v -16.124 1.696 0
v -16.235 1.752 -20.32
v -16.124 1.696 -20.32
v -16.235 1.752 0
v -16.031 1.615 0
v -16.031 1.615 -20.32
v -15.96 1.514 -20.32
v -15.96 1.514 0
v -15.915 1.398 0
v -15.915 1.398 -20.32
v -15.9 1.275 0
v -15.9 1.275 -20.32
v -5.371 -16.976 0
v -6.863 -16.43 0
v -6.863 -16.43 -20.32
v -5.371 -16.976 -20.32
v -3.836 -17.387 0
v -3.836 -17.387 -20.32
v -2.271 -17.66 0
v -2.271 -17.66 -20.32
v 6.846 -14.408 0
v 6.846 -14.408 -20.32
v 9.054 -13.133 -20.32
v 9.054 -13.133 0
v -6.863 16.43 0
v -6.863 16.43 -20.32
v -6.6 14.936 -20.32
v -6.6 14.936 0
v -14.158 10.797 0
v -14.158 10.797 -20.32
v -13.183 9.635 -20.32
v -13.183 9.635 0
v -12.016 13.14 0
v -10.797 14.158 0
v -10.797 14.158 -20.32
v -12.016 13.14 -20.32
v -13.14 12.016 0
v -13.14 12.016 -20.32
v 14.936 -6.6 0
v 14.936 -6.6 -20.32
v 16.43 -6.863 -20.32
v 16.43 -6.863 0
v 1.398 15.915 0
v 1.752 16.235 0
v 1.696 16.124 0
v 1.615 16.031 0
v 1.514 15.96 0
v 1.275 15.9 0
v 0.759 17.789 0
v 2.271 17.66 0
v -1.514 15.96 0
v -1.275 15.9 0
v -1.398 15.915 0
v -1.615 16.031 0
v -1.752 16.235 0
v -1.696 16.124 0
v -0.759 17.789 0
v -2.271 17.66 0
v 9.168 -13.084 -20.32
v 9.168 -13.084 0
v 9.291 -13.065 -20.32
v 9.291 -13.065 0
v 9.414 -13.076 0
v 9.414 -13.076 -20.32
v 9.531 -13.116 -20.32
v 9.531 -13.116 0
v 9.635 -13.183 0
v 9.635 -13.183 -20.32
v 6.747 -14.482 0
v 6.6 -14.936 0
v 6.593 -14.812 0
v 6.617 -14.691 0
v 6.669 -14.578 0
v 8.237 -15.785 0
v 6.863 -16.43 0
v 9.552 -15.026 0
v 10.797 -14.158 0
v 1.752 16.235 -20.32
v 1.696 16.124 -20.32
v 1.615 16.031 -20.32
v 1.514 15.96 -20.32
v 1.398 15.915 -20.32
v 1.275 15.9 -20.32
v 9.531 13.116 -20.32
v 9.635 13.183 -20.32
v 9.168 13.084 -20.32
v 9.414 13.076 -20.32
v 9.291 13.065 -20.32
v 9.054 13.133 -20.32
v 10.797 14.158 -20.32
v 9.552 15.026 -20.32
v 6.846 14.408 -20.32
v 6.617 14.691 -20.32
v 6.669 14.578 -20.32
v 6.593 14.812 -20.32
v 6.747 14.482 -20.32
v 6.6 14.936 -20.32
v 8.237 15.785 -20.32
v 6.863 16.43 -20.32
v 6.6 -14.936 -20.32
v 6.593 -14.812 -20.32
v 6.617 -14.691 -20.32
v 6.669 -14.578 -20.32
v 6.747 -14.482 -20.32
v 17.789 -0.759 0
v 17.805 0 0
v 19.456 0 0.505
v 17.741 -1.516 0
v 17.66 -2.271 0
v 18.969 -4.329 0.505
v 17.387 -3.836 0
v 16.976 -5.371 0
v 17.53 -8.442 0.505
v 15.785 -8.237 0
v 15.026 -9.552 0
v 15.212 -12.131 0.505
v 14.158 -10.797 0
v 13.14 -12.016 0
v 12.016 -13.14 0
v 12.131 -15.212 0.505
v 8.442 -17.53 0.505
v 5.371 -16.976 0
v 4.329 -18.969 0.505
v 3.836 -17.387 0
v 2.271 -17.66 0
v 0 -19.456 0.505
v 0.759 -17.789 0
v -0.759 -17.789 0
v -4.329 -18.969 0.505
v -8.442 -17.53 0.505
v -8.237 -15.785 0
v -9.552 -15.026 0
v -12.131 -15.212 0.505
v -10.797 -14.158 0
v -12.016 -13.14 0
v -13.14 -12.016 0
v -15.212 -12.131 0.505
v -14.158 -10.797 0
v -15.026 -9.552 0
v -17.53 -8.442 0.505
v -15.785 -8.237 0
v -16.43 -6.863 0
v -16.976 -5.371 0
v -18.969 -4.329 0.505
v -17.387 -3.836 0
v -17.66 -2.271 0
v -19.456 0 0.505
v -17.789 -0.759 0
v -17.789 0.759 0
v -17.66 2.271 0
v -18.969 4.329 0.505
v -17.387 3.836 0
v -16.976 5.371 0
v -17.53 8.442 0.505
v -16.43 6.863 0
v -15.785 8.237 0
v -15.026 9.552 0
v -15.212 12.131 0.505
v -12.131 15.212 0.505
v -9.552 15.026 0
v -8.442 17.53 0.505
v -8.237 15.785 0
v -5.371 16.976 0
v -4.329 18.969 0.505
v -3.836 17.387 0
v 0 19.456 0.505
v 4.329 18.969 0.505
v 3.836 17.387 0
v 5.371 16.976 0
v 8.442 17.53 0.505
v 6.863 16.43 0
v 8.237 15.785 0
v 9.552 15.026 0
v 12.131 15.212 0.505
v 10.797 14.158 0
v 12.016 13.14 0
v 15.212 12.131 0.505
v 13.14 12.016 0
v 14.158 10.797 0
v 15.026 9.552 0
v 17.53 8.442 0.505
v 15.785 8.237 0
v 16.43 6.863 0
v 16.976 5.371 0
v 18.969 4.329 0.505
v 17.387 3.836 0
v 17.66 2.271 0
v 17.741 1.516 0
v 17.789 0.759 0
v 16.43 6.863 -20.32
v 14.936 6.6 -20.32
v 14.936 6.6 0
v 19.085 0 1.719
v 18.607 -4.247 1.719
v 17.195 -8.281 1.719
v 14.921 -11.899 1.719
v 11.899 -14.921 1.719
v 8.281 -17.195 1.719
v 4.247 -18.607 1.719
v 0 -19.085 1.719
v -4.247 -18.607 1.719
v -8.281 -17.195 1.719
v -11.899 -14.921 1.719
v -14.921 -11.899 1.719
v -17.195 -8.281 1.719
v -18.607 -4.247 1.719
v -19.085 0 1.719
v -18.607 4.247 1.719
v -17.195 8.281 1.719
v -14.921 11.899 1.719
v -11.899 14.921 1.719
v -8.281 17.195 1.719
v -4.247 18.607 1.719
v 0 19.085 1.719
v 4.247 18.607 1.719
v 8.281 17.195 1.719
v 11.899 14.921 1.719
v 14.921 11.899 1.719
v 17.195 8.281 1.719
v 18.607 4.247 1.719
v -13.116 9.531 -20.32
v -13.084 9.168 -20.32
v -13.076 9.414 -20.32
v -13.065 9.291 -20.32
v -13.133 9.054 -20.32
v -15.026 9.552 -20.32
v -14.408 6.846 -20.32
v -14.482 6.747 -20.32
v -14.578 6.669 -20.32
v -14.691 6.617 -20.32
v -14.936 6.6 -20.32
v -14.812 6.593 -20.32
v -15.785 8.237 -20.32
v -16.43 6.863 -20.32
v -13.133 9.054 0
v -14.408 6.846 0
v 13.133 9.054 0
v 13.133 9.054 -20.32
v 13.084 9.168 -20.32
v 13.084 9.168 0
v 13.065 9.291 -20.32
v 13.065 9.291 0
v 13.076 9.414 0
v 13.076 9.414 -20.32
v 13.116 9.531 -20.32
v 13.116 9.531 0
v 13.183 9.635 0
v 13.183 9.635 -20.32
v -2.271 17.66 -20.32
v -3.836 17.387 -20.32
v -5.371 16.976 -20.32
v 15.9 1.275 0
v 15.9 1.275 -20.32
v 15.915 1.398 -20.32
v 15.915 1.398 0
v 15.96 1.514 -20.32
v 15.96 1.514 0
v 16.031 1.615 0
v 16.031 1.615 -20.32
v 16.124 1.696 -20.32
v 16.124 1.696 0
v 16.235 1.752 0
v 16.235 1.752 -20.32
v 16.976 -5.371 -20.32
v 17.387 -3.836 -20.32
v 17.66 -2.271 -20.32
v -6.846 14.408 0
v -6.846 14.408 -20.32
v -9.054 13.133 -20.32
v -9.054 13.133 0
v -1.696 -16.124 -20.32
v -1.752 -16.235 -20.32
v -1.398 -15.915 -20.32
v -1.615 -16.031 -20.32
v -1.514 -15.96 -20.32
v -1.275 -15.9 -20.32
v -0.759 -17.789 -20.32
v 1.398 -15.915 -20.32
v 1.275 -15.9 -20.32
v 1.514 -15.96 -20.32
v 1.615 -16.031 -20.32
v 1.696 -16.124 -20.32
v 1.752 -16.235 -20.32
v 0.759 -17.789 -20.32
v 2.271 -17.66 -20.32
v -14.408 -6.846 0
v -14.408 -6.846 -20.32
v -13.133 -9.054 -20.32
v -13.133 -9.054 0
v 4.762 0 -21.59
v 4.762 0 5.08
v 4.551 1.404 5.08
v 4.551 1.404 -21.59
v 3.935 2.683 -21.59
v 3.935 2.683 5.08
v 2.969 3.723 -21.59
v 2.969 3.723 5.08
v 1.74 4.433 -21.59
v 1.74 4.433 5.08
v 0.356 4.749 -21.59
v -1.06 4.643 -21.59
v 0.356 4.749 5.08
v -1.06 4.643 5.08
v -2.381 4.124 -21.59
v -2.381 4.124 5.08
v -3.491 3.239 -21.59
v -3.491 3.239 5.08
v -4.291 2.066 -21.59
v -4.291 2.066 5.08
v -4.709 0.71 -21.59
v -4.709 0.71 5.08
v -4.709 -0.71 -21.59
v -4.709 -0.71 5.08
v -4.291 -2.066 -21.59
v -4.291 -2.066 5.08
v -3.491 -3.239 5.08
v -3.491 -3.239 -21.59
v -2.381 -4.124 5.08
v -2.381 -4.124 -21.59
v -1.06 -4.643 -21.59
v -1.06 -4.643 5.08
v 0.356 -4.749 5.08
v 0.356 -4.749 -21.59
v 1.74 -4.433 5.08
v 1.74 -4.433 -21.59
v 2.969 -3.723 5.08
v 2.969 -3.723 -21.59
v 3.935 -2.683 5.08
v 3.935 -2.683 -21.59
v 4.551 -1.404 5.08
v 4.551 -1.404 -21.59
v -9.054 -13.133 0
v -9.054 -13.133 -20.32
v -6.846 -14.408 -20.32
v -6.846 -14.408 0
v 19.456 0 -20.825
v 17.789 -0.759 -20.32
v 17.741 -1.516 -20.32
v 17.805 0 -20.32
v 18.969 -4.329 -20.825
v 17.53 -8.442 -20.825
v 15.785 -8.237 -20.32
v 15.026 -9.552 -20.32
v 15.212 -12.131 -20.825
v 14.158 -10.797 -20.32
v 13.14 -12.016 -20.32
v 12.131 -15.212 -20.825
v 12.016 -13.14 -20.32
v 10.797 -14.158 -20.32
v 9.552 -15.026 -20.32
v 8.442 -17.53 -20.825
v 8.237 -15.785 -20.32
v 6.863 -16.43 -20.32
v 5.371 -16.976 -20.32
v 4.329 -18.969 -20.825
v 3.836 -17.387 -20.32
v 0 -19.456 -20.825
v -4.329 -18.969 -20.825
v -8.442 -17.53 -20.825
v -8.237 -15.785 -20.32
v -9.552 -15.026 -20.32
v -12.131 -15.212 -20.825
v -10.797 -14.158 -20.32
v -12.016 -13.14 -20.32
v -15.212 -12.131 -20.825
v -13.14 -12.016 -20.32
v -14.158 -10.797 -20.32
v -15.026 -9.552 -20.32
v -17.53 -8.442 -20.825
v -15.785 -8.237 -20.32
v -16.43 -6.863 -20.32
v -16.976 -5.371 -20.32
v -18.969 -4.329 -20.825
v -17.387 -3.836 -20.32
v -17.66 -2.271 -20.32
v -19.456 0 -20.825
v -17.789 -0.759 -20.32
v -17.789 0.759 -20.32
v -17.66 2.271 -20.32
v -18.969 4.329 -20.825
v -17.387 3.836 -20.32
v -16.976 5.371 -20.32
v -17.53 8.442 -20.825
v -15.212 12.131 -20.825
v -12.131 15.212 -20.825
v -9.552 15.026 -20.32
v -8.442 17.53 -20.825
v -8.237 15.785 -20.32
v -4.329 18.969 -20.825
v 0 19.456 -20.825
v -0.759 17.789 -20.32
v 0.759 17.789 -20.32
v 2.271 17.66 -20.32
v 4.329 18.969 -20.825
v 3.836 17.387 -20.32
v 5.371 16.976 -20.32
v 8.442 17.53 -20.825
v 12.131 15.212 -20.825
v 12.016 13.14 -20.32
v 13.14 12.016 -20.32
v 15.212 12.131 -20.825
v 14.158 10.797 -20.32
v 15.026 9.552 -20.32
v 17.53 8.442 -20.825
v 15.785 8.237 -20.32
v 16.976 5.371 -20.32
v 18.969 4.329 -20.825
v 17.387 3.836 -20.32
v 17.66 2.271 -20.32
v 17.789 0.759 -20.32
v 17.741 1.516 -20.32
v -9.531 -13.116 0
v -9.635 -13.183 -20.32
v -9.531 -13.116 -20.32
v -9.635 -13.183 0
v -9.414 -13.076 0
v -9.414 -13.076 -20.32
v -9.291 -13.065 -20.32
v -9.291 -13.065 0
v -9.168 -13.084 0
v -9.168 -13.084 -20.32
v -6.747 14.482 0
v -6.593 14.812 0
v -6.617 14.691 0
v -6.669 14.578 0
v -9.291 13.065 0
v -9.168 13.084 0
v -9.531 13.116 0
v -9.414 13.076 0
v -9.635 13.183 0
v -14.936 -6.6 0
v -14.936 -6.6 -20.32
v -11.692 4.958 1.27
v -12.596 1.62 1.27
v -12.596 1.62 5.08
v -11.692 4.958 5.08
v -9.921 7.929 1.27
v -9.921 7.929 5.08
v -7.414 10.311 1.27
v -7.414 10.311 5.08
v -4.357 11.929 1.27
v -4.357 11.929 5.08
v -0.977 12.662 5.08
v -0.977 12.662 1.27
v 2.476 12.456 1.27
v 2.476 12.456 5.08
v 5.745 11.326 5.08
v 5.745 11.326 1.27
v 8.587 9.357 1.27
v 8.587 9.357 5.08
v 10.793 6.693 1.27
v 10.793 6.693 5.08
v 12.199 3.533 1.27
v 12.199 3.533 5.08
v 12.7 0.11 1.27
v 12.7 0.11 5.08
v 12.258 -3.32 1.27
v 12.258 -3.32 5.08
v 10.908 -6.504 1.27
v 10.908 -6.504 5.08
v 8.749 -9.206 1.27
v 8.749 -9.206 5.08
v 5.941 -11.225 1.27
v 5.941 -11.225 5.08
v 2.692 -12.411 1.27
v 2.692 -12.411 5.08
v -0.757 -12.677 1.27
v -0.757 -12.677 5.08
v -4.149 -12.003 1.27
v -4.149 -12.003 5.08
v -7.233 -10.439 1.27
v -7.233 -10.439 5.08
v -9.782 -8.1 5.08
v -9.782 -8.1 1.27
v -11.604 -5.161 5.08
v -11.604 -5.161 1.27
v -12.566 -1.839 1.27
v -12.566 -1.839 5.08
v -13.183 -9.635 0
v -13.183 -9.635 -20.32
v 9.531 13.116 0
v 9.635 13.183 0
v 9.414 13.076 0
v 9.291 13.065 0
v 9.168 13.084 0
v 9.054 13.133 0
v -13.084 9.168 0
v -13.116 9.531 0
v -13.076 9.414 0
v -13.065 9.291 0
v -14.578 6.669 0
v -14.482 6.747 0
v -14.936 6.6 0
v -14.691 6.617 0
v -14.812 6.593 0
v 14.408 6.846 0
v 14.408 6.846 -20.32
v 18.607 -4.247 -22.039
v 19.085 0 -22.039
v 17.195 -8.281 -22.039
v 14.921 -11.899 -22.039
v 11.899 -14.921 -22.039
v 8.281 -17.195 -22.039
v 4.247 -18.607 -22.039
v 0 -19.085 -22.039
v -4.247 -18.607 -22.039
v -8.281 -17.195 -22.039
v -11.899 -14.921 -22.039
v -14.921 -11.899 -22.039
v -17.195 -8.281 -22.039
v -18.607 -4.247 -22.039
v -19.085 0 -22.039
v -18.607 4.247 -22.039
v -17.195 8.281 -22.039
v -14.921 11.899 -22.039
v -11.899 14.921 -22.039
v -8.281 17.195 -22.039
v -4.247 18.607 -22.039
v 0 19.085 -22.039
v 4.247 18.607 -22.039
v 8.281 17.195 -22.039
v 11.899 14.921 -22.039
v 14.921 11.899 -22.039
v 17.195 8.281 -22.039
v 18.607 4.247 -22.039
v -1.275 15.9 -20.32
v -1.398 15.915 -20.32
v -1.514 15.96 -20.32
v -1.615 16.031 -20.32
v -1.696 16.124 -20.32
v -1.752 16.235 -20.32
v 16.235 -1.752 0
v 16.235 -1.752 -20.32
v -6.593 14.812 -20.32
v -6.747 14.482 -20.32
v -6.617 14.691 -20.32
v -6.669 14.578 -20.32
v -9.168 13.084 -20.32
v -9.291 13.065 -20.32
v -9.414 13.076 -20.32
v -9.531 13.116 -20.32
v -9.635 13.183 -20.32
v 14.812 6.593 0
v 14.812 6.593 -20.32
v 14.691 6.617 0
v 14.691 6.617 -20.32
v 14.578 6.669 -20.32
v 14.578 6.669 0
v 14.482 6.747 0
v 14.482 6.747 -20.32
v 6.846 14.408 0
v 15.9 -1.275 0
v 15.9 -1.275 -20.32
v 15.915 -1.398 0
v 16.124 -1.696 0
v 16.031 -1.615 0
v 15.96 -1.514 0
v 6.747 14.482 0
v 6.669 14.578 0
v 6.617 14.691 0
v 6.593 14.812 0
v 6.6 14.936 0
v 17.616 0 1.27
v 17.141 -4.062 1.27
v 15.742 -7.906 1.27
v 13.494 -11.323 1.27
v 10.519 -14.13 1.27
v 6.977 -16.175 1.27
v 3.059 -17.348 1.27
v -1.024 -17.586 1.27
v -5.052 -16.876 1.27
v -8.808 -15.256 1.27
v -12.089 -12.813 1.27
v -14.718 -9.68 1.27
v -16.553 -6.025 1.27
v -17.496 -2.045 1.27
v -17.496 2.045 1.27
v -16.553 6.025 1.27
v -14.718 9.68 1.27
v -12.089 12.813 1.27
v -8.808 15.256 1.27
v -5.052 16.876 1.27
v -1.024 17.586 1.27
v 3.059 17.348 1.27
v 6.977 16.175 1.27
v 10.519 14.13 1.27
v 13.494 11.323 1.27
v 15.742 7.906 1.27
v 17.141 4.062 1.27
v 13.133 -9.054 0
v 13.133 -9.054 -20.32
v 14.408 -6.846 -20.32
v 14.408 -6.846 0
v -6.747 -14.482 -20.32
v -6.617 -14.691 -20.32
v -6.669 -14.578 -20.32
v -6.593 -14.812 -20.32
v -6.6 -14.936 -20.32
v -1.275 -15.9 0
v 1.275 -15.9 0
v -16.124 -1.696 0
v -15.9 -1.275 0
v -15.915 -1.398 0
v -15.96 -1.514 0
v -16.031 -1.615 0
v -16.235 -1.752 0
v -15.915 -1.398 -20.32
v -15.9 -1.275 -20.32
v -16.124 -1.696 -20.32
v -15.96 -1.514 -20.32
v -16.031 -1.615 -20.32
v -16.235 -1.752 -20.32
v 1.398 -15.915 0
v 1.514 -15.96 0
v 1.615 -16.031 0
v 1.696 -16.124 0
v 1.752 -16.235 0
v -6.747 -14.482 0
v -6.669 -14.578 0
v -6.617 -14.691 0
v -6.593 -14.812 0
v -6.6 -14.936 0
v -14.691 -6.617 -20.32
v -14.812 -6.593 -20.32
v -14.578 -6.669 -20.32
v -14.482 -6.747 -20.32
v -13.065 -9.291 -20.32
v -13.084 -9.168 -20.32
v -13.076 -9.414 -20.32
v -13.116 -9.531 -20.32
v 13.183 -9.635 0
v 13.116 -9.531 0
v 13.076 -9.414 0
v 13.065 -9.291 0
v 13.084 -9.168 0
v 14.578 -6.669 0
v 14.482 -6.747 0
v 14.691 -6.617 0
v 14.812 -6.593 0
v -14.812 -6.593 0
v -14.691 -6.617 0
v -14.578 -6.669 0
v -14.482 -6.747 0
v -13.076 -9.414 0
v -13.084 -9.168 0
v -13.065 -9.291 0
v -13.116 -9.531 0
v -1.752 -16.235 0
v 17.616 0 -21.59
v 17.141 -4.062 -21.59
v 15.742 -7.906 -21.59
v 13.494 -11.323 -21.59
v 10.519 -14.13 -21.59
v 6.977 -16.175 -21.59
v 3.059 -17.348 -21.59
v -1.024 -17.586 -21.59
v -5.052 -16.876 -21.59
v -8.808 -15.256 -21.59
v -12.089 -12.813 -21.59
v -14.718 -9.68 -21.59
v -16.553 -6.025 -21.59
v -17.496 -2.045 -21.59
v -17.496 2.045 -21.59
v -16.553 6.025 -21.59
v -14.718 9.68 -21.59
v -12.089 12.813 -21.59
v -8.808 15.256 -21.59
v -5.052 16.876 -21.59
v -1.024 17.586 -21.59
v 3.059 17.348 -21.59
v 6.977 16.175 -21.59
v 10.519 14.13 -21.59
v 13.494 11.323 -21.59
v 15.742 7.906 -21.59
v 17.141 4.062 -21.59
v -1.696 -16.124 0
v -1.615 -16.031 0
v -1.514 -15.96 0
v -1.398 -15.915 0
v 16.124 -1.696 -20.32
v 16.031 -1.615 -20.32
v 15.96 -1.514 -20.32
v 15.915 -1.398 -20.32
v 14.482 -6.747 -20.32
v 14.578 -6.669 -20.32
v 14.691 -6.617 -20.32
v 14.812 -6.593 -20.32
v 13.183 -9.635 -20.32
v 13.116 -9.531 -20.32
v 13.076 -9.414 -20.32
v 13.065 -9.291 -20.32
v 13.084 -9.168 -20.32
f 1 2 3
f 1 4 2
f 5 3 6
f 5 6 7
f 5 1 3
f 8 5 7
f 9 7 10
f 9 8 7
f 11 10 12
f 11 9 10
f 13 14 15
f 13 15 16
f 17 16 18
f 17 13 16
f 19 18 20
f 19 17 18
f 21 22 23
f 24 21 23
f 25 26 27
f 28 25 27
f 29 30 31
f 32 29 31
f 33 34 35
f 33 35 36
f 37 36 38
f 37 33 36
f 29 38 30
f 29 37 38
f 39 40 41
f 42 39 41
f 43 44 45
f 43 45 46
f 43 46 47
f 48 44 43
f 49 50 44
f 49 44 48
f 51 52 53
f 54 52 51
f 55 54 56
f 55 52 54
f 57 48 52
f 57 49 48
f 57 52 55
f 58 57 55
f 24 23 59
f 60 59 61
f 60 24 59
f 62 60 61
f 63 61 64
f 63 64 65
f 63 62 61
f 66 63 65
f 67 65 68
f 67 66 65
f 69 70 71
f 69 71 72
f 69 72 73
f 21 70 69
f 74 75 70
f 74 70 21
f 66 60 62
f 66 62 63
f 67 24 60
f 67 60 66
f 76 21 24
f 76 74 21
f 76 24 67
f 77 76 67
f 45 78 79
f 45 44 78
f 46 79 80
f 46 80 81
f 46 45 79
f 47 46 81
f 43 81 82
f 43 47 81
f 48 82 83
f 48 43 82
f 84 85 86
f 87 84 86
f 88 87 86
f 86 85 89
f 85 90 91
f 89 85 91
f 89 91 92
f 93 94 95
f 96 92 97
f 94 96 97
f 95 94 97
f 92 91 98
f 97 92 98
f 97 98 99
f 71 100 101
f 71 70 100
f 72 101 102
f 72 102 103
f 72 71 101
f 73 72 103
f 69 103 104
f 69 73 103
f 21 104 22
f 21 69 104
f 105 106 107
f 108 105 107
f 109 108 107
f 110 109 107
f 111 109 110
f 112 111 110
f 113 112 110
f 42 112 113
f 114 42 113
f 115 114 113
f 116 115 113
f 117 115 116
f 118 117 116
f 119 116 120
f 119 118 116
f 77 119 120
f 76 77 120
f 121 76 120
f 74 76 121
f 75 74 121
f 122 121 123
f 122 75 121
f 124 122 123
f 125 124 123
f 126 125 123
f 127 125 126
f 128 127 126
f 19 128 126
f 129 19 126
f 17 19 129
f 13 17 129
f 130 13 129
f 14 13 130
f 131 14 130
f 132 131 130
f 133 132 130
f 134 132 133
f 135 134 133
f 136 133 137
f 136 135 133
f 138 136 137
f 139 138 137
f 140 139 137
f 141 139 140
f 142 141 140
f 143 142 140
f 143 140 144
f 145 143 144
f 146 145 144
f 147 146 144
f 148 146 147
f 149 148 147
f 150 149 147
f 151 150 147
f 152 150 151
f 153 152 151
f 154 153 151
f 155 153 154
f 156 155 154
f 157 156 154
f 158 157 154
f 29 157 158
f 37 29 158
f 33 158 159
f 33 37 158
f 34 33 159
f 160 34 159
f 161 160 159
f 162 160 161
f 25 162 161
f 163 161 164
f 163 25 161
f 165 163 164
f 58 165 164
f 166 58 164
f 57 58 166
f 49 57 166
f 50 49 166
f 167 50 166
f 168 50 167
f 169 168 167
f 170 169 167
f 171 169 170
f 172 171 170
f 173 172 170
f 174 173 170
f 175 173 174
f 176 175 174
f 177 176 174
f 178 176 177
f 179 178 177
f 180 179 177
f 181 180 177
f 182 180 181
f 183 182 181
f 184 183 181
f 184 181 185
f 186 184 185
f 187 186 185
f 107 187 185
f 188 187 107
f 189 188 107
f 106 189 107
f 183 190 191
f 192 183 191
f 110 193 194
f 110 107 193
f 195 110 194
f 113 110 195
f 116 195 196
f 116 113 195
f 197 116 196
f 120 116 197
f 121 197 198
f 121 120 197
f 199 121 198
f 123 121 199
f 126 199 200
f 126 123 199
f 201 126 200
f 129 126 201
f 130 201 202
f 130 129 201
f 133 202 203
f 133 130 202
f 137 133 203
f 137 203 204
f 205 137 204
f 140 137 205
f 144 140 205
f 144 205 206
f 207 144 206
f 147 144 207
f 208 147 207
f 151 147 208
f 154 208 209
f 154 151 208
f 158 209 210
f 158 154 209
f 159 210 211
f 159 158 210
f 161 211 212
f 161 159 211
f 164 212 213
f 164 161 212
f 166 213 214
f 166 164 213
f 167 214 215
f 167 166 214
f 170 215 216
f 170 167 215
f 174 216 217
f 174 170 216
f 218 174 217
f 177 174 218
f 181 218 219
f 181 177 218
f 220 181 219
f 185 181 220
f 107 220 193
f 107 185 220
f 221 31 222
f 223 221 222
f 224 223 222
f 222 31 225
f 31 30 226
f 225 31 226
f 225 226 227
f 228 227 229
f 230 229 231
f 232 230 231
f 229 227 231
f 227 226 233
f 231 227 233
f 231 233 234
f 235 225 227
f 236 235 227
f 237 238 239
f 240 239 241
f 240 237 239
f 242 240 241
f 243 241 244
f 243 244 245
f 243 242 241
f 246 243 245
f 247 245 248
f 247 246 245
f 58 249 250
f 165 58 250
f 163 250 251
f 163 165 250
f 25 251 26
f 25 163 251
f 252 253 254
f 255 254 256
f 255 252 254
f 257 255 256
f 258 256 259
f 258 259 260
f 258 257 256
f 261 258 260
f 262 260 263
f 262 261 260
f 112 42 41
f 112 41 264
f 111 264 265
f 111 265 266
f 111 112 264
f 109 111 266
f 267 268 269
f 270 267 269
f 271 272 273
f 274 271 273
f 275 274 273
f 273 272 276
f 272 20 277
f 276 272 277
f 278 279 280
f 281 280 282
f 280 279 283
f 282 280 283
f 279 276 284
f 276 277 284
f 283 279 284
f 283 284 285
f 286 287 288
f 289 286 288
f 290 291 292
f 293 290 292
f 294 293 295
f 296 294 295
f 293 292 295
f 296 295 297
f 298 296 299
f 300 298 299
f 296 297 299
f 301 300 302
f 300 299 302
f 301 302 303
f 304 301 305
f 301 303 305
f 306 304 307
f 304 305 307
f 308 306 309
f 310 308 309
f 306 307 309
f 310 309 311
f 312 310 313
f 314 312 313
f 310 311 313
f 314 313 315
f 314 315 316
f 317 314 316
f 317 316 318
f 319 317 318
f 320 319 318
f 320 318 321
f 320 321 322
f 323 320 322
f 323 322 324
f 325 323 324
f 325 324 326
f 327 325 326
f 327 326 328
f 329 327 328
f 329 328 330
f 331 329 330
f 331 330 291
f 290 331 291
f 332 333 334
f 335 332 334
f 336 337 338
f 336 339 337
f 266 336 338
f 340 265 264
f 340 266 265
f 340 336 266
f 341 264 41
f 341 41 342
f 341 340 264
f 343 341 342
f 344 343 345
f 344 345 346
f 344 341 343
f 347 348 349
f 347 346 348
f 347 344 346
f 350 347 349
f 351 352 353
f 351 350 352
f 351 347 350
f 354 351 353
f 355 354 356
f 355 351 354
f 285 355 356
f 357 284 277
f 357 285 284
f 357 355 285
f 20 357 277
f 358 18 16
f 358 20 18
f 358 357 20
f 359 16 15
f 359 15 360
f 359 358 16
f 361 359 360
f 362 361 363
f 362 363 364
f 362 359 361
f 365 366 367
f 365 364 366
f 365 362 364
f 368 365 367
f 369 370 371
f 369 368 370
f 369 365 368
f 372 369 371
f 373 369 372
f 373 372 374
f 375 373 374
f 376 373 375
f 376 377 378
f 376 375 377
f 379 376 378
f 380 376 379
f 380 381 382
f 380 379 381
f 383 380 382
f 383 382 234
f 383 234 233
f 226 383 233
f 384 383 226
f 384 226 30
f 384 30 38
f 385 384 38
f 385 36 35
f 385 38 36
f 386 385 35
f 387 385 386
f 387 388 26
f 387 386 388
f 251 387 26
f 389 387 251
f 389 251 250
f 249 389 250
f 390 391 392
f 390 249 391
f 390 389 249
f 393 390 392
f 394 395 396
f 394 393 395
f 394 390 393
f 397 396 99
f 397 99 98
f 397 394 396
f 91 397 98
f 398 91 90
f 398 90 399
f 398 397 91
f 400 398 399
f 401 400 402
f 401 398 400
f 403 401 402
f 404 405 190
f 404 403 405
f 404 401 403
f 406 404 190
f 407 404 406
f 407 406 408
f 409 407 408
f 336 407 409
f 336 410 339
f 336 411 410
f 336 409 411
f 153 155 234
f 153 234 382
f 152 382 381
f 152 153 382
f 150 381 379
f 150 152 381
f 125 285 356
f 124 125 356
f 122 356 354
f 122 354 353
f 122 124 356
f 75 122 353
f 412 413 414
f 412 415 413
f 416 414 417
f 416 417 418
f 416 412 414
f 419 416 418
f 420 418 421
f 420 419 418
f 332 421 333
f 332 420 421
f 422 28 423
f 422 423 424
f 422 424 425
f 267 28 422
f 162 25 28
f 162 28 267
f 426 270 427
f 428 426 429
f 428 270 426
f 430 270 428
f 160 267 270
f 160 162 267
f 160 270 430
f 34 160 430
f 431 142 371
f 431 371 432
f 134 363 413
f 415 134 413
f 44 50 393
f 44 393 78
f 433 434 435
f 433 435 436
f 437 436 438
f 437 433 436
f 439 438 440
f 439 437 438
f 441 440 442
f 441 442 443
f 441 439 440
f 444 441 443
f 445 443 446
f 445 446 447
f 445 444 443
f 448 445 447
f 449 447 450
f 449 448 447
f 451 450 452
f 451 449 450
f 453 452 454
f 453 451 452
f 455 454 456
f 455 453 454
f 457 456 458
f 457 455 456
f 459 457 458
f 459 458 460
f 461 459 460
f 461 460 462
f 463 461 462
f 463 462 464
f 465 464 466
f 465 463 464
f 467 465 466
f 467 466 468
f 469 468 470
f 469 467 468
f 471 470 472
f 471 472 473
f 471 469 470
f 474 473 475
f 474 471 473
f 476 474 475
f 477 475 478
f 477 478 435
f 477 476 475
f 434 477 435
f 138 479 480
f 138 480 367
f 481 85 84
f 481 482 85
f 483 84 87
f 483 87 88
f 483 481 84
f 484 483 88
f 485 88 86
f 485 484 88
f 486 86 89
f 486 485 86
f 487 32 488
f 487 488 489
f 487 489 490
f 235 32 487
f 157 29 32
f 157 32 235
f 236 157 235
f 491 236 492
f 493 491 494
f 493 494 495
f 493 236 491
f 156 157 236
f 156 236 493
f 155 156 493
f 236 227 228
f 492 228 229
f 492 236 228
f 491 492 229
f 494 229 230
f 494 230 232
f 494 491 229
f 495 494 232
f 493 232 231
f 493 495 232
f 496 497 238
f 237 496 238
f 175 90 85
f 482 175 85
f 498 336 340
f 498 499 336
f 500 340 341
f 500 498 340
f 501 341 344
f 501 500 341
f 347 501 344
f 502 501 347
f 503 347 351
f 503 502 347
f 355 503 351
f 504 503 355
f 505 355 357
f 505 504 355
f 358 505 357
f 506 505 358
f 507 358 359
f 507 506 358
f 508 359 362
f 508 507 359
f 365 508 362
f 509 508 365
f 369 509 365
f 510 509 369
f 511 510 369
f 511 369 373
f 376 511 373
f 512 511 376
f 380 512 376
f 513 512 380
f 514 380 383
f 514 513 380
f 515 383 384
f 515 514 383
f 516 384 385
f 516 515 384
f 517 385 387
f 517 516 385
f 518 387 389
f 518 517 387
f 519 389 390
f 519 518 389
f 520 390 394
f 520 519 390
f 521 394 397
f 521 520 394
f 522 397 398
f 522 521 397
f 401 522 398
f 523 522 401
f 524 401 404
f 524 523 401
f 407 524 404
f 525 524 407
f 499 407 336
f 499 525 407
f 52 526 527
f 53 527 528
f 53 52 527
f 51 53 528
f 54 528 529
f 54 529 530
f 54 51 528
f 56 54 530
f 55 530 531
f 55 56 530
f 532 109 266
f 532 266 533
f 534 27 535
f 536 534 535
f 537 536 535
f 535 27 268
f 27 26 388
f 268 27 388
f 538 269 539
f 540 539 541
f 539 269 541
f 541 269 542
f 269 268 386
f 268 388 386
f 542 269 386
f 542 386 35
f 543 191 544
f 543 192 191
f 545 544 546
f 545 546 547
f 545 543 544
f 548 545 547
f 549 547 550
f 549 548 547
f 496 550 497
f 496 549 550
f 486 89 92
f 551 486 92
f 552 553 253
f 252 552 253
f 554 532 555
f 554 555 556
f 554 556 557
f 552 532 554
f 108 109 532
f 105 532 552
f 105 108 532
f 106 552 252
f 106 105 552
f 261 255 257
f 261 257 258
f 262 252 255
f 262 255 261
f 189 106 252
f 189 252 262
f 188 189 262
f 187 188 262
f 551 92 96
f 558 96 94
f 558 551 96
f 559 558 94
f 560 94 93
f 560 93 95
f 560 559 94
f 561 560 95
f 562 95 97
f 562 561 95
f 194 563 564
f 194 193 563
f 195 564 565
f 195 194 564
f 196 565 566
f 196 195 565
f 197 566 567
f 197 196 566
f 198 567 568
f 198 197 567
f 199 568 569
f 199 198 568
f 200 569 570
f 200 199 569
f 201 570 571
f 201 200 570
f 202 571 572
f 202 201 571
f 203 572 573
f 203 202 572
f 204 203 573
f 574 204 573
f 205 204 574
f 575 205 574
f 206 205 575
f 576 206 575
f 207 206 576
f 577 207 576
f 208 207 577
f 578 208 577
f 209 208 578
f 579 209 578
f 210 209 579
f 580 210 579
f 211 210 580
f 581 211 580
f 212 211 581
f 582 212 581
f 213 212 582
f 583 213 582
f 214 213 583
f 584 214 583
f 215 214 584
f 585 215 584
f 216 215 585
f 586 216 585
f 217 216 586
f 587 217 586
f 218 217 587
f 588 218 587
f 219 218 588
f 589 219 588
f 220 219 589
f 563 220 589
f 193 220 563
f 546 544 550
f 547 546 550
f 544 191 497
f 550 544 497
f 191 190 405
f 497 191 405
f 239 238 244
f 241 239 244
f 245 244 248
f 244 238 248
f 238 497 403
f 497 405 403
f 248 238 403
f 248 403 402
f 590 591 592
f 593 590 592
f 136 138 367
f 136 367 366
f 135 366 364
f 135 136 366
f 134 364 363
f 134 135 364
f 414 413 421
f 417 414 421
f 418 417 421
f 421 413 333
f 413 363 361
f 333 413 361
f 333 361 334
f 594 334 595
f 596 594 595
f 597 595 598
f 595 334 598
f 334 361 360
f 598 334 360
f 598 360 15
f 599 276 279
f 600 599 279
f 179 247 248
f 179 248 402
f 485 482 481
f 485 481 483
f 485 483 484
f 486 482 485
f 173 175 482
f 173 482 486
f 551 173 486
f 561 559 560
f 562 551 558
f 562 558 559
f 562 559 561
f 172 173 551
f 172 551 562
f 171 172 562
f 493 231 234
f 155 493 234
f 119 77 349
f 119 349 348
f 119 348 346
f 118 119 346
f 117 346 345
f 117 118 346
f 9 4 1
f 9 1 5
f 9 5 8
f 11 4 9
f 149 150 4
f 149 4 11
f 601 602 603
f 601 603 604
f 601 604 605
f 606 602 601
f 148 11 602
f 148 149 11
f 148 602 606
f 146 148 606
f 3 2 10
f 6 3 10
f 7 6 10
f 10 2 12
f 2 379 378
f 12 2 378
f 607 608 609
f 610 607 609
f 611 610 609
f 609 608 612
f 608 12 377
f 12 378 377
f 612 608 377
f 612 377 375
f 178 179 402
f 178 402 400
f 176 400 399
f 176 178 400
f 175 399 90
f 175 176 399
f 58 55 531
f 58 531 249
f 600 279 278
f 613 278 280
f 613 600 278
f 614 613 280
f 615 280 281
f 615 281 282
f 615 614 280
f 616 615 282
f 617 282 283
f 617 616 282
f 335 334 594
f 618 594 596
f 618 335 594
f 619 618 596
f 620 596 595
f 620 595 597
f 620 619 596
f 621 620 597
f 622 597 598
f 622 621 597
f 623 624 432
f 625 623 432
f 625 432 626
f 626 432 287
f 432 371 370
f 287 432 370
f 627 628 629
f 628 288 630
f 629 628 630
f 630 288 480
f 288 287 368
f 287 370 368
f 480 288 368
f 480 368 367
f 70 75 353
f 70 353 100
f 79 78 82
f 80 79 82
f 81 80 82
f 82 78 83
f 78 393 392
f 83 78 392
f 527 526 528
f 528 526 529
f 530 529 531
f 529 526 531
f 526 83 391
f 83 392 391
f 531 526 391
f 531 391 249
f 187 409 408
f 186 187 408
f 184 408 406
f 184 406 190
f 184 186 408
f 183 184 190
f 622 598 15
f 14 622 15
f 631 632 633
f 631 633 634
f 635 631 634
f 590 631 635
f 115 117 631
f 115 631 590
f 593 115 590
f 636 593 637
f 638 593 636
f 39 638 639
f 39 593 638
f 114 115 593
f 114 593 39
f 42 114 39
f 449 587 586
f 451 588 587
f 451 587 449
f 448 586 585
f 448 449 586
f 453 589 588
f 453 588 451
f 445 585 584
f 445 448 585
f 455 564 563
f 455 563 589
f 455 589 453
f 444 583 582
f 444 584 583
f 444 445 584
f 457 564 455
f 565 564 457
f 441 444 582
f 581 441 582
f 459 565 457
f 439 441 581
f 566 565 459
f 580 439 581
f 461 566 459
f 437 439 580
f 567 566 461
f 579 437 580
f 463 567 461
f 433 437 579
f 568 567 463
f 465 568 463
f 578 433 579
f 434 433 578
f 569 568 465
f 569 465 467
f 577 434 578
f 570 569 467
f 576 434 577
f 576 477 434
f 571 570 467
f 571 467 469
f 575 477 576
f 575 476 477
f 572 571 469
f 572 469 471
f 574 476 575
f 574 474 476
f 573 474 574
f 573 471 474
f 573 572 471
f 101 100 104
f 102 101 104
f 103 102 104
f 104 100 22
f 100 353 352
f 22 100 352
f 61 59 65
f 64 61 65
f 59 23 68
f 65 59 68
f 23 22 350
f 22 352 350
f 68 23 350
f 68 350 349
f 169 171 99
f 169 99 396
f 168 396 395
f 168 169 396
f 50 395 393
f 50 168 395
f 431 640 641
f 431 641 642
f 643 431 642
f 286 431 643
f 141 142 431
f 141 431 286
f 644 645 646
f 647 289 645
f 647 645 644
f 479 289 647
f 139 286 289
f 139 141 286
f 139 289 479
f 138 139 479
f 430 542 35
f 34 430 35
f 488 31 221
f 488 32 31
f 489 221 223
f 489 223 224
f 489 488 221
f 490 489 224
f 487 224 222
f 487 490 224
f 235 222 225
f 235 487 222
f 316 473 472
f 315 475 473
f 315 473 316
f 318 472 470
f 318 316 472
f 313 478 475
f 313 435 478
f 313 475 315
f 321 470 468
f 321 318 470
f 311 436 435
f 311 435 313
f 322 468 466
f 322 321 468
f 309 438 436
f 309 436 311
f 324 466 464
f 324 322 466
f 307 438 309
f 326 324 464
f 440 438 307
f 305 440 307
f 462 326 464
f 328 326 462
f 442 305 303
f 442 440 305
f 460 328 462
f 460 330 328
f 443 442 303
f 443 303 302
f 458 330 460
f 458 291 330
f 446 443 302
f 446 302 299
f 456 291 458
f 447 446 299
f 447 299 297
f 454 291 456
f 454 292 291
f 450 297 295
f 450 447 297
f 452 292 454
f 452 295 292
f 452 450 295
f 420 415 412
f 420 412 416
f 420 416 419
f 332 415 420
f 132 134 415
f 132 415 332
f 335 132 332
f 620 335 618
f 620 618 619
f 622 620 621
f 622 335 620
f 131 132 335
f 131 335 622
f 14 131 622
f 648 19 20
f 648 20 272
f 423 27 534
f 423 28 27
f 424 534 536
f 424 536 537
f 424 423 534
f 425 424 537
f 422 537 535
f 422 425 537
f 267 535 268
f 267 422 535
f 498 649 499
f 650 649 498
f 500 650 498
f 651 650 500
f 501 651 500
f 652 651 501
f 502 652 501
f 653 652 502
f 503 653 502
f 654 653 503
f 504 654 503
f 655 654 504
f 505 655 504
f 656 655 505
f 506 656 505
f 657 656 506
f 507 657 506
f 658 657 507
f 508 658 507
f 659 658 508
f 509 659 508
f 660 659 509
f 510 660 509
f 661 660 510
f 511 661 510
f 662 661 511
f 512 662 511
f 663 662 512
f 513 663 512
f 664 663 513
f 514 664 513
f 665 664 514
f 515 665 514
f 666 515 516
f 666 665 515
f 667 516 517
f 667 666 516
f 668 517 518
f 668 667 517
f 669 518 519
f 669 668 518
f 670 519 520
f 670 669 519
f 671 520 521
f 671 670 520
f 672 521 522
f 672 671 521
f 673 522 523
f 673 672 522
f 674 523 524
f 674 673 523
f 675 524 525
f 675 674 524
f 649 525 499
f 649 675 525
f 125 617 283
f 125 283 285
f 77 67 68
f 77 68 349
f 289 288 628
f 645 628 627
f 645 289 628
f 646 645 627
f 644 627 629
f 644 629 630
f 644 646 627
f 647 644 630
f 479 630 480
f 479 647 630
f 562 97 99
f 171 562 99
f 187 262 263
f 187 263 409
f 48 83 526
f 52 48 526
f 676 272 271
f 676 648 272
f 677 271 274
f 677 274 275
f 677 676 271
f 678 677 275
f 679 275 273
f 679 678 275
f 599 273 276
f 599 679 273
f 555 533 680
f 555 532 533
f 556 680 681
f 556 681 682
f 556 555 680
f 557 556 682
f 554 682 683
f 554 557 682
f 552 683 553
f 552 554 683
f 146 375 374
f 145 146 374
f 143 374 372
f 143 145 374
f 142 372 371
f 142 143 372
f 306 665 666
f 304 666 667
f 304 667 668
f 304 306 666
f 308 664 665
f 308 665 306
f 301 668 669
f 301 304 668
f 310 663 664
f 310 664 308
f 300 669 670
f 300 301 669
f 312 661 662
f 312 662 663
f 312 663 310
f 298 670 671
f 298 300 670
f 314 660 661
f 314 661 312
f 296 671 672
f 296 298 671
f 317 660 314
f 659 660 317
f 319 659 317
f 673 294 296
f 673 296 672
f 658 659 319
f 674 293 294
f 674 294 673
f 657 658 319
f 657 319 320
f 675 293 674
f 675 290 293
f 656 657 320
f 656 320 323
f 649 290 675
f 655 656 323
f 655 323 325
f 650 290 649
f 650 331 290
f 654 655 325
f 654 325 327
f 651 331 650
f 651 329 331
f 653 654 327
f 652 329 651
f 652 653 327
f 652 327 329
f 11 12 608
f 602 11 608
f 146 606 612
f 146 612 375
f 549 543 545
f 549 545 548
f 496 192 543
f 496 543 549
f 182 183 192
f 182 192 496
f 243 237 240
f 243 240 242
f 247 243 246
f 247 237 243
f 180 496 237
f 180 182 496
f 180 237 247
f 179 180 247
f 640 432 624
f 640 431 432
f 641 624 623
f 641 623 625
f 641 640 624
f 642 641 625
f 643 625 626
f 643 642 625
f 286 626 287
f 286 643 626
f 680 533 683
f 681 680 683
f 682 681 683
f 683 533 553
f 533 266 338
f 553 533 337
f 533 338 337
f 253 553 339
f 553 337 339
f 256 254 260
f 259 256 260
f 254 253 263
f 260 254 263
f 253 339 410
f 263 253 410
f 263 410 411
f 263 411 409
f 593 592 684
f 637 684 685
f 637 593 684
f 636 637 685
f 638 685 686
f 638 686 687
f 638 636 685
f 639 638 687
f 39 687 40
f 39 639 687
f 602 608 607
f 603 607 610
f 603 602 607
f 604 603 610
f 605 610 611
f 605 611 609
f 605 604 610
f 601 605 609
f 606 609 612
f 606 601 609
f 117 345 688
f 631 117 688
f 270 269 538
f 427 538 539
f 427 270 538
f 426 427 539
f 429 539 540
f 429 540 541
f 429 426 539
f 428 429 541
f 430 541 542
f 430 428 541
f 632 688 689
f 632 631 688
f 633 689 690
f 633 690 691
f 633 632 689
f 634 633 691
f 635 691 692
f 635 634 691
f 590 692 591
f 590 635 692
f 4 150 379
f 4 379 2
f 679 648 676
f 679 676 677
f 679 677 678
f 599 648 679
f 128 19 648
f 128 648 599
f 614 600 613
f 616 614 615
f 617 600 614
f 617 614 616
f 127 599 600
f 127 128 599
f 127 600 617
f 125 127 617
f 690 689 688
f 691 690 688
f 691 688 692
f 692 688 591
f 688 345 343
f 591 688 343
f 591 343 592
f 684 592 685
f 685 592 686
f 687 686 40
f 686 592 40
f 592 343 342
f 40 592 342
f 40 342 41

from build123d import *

# Parameters (mm, degrees)
SKETCH1_R        = 17.8054
BASEPULLEY_DEPTH = 20.32
GROOVE_DEPTH     = 10.16
GROOVES_COUNT    = 12
GROOVES_ANGLE    = 330
SKETCH4_W        = 5.08
SKETCH4_H        = 12.7
BORSKE_R         = 4.7625
BORE_DEPTH       = 39.633634572


with BuildPart() as part:
    # Sketch1 → BasePulley (new body)
    with BuildSketch(Plane.XY):
        Circle(SKETCH1_R)
    extrude(amount=-BASEPULLEY_DEPTH)

    # Sketch2 → Flange (revolve)
    with BuildSketch(Plane(origin=(0, 0, 0), x_dir=(0, 0, -1), z_dir=(1, 0, 0)), mode=Mode.PRIVATE) as flange_sk:
        Polygon((20.32, 17.8054), (20.824761355, 19.4564), (22.039268395, 19.085087935), (21.59, 17.615597228), (21.59, 0), (-1.27, 0), (-1.27, 17.615597228), (-1.719268395, 19.085087935), (-0.504761355, 19.4564), (0, 17.8054), align=None)
    revolve(flange_sk.sketch.rotate(Axis((0, 0, 0), (0, 0, -1)), 90), axis=Axis((0, 0, 0), (0, 0, -1)))

    # Sketch3 → Groove (cut, symmetric)
    with BuildSketch(Plane.XY.offset(-10.16)):
        with BuildLine():
            Line((-2.3241, 17.8054), (-2.3241, 43.2054))
            Line((-2.3241, 43.2054), (2.3241, 43.2054))
            Line((2.3241, 43.2054), (2.3241, 17.8054))
            Line((2.3241, 17.8054), (1.752395126, 16.234653767))
            ThreePointArc((1.752395126, 16.234653767), (1.566408104, 15.992270762), (1.275031274, 15.9004))
            Line((1.275031274, 15.9004), (-1.275031274, 15.9004))
            ThreePointArc((-1.275031274, 15.9004), (-1.566408104, 15.992270762), (-1.752395126, 16.234653767))
            Line((-1.752395126, 16.234653767), (-2.3241, 17.8054))
        make_face()
    groove = extrude(amount=GROOVE_DEPTH, both=True, mode=Mode.SUBTRACT)

    # Grooves: Groove ×12 about axis
    grooves_axis = Axis((0, 0, -20.32), (0, 0, 1))
    for i in range(1, GROOVES_COUNT):
        add(groove.rotate(grooves_axis, i * GROOVES_ANGLE / (GROOVES_COUNT - 1)), mode=Mode.SUBTRACT)

    # Sketch4 → BaseHub (revolve)
    with BuildSketch(Plane(origin=(0, 0, 0), x_dir=(0, 0, -1), z_dir=(1, 0, 0)), mode=Mode.PRIVATE) as basehub_sk:
        with Locations((-2.54, 6.35)):
            Rectangle(SKETCH4_W, SKETCH4_H)
    revolve(basehub_sk.sketch.rotate(Axis((0, 0, 0), (0, 0, -1)), 277.328312747), axis=Axis((0, 0, 0), (0, 0, -1)))

    # BorSke → Bore (cut, through all)
    with BuildSketch(Plane.XY.offset(5.08)):
        Circle(BORSKE_R)
    extrude(amount=-BORE_DEPTH, mode=Mode.SUBTRACT)


solid = part.part
